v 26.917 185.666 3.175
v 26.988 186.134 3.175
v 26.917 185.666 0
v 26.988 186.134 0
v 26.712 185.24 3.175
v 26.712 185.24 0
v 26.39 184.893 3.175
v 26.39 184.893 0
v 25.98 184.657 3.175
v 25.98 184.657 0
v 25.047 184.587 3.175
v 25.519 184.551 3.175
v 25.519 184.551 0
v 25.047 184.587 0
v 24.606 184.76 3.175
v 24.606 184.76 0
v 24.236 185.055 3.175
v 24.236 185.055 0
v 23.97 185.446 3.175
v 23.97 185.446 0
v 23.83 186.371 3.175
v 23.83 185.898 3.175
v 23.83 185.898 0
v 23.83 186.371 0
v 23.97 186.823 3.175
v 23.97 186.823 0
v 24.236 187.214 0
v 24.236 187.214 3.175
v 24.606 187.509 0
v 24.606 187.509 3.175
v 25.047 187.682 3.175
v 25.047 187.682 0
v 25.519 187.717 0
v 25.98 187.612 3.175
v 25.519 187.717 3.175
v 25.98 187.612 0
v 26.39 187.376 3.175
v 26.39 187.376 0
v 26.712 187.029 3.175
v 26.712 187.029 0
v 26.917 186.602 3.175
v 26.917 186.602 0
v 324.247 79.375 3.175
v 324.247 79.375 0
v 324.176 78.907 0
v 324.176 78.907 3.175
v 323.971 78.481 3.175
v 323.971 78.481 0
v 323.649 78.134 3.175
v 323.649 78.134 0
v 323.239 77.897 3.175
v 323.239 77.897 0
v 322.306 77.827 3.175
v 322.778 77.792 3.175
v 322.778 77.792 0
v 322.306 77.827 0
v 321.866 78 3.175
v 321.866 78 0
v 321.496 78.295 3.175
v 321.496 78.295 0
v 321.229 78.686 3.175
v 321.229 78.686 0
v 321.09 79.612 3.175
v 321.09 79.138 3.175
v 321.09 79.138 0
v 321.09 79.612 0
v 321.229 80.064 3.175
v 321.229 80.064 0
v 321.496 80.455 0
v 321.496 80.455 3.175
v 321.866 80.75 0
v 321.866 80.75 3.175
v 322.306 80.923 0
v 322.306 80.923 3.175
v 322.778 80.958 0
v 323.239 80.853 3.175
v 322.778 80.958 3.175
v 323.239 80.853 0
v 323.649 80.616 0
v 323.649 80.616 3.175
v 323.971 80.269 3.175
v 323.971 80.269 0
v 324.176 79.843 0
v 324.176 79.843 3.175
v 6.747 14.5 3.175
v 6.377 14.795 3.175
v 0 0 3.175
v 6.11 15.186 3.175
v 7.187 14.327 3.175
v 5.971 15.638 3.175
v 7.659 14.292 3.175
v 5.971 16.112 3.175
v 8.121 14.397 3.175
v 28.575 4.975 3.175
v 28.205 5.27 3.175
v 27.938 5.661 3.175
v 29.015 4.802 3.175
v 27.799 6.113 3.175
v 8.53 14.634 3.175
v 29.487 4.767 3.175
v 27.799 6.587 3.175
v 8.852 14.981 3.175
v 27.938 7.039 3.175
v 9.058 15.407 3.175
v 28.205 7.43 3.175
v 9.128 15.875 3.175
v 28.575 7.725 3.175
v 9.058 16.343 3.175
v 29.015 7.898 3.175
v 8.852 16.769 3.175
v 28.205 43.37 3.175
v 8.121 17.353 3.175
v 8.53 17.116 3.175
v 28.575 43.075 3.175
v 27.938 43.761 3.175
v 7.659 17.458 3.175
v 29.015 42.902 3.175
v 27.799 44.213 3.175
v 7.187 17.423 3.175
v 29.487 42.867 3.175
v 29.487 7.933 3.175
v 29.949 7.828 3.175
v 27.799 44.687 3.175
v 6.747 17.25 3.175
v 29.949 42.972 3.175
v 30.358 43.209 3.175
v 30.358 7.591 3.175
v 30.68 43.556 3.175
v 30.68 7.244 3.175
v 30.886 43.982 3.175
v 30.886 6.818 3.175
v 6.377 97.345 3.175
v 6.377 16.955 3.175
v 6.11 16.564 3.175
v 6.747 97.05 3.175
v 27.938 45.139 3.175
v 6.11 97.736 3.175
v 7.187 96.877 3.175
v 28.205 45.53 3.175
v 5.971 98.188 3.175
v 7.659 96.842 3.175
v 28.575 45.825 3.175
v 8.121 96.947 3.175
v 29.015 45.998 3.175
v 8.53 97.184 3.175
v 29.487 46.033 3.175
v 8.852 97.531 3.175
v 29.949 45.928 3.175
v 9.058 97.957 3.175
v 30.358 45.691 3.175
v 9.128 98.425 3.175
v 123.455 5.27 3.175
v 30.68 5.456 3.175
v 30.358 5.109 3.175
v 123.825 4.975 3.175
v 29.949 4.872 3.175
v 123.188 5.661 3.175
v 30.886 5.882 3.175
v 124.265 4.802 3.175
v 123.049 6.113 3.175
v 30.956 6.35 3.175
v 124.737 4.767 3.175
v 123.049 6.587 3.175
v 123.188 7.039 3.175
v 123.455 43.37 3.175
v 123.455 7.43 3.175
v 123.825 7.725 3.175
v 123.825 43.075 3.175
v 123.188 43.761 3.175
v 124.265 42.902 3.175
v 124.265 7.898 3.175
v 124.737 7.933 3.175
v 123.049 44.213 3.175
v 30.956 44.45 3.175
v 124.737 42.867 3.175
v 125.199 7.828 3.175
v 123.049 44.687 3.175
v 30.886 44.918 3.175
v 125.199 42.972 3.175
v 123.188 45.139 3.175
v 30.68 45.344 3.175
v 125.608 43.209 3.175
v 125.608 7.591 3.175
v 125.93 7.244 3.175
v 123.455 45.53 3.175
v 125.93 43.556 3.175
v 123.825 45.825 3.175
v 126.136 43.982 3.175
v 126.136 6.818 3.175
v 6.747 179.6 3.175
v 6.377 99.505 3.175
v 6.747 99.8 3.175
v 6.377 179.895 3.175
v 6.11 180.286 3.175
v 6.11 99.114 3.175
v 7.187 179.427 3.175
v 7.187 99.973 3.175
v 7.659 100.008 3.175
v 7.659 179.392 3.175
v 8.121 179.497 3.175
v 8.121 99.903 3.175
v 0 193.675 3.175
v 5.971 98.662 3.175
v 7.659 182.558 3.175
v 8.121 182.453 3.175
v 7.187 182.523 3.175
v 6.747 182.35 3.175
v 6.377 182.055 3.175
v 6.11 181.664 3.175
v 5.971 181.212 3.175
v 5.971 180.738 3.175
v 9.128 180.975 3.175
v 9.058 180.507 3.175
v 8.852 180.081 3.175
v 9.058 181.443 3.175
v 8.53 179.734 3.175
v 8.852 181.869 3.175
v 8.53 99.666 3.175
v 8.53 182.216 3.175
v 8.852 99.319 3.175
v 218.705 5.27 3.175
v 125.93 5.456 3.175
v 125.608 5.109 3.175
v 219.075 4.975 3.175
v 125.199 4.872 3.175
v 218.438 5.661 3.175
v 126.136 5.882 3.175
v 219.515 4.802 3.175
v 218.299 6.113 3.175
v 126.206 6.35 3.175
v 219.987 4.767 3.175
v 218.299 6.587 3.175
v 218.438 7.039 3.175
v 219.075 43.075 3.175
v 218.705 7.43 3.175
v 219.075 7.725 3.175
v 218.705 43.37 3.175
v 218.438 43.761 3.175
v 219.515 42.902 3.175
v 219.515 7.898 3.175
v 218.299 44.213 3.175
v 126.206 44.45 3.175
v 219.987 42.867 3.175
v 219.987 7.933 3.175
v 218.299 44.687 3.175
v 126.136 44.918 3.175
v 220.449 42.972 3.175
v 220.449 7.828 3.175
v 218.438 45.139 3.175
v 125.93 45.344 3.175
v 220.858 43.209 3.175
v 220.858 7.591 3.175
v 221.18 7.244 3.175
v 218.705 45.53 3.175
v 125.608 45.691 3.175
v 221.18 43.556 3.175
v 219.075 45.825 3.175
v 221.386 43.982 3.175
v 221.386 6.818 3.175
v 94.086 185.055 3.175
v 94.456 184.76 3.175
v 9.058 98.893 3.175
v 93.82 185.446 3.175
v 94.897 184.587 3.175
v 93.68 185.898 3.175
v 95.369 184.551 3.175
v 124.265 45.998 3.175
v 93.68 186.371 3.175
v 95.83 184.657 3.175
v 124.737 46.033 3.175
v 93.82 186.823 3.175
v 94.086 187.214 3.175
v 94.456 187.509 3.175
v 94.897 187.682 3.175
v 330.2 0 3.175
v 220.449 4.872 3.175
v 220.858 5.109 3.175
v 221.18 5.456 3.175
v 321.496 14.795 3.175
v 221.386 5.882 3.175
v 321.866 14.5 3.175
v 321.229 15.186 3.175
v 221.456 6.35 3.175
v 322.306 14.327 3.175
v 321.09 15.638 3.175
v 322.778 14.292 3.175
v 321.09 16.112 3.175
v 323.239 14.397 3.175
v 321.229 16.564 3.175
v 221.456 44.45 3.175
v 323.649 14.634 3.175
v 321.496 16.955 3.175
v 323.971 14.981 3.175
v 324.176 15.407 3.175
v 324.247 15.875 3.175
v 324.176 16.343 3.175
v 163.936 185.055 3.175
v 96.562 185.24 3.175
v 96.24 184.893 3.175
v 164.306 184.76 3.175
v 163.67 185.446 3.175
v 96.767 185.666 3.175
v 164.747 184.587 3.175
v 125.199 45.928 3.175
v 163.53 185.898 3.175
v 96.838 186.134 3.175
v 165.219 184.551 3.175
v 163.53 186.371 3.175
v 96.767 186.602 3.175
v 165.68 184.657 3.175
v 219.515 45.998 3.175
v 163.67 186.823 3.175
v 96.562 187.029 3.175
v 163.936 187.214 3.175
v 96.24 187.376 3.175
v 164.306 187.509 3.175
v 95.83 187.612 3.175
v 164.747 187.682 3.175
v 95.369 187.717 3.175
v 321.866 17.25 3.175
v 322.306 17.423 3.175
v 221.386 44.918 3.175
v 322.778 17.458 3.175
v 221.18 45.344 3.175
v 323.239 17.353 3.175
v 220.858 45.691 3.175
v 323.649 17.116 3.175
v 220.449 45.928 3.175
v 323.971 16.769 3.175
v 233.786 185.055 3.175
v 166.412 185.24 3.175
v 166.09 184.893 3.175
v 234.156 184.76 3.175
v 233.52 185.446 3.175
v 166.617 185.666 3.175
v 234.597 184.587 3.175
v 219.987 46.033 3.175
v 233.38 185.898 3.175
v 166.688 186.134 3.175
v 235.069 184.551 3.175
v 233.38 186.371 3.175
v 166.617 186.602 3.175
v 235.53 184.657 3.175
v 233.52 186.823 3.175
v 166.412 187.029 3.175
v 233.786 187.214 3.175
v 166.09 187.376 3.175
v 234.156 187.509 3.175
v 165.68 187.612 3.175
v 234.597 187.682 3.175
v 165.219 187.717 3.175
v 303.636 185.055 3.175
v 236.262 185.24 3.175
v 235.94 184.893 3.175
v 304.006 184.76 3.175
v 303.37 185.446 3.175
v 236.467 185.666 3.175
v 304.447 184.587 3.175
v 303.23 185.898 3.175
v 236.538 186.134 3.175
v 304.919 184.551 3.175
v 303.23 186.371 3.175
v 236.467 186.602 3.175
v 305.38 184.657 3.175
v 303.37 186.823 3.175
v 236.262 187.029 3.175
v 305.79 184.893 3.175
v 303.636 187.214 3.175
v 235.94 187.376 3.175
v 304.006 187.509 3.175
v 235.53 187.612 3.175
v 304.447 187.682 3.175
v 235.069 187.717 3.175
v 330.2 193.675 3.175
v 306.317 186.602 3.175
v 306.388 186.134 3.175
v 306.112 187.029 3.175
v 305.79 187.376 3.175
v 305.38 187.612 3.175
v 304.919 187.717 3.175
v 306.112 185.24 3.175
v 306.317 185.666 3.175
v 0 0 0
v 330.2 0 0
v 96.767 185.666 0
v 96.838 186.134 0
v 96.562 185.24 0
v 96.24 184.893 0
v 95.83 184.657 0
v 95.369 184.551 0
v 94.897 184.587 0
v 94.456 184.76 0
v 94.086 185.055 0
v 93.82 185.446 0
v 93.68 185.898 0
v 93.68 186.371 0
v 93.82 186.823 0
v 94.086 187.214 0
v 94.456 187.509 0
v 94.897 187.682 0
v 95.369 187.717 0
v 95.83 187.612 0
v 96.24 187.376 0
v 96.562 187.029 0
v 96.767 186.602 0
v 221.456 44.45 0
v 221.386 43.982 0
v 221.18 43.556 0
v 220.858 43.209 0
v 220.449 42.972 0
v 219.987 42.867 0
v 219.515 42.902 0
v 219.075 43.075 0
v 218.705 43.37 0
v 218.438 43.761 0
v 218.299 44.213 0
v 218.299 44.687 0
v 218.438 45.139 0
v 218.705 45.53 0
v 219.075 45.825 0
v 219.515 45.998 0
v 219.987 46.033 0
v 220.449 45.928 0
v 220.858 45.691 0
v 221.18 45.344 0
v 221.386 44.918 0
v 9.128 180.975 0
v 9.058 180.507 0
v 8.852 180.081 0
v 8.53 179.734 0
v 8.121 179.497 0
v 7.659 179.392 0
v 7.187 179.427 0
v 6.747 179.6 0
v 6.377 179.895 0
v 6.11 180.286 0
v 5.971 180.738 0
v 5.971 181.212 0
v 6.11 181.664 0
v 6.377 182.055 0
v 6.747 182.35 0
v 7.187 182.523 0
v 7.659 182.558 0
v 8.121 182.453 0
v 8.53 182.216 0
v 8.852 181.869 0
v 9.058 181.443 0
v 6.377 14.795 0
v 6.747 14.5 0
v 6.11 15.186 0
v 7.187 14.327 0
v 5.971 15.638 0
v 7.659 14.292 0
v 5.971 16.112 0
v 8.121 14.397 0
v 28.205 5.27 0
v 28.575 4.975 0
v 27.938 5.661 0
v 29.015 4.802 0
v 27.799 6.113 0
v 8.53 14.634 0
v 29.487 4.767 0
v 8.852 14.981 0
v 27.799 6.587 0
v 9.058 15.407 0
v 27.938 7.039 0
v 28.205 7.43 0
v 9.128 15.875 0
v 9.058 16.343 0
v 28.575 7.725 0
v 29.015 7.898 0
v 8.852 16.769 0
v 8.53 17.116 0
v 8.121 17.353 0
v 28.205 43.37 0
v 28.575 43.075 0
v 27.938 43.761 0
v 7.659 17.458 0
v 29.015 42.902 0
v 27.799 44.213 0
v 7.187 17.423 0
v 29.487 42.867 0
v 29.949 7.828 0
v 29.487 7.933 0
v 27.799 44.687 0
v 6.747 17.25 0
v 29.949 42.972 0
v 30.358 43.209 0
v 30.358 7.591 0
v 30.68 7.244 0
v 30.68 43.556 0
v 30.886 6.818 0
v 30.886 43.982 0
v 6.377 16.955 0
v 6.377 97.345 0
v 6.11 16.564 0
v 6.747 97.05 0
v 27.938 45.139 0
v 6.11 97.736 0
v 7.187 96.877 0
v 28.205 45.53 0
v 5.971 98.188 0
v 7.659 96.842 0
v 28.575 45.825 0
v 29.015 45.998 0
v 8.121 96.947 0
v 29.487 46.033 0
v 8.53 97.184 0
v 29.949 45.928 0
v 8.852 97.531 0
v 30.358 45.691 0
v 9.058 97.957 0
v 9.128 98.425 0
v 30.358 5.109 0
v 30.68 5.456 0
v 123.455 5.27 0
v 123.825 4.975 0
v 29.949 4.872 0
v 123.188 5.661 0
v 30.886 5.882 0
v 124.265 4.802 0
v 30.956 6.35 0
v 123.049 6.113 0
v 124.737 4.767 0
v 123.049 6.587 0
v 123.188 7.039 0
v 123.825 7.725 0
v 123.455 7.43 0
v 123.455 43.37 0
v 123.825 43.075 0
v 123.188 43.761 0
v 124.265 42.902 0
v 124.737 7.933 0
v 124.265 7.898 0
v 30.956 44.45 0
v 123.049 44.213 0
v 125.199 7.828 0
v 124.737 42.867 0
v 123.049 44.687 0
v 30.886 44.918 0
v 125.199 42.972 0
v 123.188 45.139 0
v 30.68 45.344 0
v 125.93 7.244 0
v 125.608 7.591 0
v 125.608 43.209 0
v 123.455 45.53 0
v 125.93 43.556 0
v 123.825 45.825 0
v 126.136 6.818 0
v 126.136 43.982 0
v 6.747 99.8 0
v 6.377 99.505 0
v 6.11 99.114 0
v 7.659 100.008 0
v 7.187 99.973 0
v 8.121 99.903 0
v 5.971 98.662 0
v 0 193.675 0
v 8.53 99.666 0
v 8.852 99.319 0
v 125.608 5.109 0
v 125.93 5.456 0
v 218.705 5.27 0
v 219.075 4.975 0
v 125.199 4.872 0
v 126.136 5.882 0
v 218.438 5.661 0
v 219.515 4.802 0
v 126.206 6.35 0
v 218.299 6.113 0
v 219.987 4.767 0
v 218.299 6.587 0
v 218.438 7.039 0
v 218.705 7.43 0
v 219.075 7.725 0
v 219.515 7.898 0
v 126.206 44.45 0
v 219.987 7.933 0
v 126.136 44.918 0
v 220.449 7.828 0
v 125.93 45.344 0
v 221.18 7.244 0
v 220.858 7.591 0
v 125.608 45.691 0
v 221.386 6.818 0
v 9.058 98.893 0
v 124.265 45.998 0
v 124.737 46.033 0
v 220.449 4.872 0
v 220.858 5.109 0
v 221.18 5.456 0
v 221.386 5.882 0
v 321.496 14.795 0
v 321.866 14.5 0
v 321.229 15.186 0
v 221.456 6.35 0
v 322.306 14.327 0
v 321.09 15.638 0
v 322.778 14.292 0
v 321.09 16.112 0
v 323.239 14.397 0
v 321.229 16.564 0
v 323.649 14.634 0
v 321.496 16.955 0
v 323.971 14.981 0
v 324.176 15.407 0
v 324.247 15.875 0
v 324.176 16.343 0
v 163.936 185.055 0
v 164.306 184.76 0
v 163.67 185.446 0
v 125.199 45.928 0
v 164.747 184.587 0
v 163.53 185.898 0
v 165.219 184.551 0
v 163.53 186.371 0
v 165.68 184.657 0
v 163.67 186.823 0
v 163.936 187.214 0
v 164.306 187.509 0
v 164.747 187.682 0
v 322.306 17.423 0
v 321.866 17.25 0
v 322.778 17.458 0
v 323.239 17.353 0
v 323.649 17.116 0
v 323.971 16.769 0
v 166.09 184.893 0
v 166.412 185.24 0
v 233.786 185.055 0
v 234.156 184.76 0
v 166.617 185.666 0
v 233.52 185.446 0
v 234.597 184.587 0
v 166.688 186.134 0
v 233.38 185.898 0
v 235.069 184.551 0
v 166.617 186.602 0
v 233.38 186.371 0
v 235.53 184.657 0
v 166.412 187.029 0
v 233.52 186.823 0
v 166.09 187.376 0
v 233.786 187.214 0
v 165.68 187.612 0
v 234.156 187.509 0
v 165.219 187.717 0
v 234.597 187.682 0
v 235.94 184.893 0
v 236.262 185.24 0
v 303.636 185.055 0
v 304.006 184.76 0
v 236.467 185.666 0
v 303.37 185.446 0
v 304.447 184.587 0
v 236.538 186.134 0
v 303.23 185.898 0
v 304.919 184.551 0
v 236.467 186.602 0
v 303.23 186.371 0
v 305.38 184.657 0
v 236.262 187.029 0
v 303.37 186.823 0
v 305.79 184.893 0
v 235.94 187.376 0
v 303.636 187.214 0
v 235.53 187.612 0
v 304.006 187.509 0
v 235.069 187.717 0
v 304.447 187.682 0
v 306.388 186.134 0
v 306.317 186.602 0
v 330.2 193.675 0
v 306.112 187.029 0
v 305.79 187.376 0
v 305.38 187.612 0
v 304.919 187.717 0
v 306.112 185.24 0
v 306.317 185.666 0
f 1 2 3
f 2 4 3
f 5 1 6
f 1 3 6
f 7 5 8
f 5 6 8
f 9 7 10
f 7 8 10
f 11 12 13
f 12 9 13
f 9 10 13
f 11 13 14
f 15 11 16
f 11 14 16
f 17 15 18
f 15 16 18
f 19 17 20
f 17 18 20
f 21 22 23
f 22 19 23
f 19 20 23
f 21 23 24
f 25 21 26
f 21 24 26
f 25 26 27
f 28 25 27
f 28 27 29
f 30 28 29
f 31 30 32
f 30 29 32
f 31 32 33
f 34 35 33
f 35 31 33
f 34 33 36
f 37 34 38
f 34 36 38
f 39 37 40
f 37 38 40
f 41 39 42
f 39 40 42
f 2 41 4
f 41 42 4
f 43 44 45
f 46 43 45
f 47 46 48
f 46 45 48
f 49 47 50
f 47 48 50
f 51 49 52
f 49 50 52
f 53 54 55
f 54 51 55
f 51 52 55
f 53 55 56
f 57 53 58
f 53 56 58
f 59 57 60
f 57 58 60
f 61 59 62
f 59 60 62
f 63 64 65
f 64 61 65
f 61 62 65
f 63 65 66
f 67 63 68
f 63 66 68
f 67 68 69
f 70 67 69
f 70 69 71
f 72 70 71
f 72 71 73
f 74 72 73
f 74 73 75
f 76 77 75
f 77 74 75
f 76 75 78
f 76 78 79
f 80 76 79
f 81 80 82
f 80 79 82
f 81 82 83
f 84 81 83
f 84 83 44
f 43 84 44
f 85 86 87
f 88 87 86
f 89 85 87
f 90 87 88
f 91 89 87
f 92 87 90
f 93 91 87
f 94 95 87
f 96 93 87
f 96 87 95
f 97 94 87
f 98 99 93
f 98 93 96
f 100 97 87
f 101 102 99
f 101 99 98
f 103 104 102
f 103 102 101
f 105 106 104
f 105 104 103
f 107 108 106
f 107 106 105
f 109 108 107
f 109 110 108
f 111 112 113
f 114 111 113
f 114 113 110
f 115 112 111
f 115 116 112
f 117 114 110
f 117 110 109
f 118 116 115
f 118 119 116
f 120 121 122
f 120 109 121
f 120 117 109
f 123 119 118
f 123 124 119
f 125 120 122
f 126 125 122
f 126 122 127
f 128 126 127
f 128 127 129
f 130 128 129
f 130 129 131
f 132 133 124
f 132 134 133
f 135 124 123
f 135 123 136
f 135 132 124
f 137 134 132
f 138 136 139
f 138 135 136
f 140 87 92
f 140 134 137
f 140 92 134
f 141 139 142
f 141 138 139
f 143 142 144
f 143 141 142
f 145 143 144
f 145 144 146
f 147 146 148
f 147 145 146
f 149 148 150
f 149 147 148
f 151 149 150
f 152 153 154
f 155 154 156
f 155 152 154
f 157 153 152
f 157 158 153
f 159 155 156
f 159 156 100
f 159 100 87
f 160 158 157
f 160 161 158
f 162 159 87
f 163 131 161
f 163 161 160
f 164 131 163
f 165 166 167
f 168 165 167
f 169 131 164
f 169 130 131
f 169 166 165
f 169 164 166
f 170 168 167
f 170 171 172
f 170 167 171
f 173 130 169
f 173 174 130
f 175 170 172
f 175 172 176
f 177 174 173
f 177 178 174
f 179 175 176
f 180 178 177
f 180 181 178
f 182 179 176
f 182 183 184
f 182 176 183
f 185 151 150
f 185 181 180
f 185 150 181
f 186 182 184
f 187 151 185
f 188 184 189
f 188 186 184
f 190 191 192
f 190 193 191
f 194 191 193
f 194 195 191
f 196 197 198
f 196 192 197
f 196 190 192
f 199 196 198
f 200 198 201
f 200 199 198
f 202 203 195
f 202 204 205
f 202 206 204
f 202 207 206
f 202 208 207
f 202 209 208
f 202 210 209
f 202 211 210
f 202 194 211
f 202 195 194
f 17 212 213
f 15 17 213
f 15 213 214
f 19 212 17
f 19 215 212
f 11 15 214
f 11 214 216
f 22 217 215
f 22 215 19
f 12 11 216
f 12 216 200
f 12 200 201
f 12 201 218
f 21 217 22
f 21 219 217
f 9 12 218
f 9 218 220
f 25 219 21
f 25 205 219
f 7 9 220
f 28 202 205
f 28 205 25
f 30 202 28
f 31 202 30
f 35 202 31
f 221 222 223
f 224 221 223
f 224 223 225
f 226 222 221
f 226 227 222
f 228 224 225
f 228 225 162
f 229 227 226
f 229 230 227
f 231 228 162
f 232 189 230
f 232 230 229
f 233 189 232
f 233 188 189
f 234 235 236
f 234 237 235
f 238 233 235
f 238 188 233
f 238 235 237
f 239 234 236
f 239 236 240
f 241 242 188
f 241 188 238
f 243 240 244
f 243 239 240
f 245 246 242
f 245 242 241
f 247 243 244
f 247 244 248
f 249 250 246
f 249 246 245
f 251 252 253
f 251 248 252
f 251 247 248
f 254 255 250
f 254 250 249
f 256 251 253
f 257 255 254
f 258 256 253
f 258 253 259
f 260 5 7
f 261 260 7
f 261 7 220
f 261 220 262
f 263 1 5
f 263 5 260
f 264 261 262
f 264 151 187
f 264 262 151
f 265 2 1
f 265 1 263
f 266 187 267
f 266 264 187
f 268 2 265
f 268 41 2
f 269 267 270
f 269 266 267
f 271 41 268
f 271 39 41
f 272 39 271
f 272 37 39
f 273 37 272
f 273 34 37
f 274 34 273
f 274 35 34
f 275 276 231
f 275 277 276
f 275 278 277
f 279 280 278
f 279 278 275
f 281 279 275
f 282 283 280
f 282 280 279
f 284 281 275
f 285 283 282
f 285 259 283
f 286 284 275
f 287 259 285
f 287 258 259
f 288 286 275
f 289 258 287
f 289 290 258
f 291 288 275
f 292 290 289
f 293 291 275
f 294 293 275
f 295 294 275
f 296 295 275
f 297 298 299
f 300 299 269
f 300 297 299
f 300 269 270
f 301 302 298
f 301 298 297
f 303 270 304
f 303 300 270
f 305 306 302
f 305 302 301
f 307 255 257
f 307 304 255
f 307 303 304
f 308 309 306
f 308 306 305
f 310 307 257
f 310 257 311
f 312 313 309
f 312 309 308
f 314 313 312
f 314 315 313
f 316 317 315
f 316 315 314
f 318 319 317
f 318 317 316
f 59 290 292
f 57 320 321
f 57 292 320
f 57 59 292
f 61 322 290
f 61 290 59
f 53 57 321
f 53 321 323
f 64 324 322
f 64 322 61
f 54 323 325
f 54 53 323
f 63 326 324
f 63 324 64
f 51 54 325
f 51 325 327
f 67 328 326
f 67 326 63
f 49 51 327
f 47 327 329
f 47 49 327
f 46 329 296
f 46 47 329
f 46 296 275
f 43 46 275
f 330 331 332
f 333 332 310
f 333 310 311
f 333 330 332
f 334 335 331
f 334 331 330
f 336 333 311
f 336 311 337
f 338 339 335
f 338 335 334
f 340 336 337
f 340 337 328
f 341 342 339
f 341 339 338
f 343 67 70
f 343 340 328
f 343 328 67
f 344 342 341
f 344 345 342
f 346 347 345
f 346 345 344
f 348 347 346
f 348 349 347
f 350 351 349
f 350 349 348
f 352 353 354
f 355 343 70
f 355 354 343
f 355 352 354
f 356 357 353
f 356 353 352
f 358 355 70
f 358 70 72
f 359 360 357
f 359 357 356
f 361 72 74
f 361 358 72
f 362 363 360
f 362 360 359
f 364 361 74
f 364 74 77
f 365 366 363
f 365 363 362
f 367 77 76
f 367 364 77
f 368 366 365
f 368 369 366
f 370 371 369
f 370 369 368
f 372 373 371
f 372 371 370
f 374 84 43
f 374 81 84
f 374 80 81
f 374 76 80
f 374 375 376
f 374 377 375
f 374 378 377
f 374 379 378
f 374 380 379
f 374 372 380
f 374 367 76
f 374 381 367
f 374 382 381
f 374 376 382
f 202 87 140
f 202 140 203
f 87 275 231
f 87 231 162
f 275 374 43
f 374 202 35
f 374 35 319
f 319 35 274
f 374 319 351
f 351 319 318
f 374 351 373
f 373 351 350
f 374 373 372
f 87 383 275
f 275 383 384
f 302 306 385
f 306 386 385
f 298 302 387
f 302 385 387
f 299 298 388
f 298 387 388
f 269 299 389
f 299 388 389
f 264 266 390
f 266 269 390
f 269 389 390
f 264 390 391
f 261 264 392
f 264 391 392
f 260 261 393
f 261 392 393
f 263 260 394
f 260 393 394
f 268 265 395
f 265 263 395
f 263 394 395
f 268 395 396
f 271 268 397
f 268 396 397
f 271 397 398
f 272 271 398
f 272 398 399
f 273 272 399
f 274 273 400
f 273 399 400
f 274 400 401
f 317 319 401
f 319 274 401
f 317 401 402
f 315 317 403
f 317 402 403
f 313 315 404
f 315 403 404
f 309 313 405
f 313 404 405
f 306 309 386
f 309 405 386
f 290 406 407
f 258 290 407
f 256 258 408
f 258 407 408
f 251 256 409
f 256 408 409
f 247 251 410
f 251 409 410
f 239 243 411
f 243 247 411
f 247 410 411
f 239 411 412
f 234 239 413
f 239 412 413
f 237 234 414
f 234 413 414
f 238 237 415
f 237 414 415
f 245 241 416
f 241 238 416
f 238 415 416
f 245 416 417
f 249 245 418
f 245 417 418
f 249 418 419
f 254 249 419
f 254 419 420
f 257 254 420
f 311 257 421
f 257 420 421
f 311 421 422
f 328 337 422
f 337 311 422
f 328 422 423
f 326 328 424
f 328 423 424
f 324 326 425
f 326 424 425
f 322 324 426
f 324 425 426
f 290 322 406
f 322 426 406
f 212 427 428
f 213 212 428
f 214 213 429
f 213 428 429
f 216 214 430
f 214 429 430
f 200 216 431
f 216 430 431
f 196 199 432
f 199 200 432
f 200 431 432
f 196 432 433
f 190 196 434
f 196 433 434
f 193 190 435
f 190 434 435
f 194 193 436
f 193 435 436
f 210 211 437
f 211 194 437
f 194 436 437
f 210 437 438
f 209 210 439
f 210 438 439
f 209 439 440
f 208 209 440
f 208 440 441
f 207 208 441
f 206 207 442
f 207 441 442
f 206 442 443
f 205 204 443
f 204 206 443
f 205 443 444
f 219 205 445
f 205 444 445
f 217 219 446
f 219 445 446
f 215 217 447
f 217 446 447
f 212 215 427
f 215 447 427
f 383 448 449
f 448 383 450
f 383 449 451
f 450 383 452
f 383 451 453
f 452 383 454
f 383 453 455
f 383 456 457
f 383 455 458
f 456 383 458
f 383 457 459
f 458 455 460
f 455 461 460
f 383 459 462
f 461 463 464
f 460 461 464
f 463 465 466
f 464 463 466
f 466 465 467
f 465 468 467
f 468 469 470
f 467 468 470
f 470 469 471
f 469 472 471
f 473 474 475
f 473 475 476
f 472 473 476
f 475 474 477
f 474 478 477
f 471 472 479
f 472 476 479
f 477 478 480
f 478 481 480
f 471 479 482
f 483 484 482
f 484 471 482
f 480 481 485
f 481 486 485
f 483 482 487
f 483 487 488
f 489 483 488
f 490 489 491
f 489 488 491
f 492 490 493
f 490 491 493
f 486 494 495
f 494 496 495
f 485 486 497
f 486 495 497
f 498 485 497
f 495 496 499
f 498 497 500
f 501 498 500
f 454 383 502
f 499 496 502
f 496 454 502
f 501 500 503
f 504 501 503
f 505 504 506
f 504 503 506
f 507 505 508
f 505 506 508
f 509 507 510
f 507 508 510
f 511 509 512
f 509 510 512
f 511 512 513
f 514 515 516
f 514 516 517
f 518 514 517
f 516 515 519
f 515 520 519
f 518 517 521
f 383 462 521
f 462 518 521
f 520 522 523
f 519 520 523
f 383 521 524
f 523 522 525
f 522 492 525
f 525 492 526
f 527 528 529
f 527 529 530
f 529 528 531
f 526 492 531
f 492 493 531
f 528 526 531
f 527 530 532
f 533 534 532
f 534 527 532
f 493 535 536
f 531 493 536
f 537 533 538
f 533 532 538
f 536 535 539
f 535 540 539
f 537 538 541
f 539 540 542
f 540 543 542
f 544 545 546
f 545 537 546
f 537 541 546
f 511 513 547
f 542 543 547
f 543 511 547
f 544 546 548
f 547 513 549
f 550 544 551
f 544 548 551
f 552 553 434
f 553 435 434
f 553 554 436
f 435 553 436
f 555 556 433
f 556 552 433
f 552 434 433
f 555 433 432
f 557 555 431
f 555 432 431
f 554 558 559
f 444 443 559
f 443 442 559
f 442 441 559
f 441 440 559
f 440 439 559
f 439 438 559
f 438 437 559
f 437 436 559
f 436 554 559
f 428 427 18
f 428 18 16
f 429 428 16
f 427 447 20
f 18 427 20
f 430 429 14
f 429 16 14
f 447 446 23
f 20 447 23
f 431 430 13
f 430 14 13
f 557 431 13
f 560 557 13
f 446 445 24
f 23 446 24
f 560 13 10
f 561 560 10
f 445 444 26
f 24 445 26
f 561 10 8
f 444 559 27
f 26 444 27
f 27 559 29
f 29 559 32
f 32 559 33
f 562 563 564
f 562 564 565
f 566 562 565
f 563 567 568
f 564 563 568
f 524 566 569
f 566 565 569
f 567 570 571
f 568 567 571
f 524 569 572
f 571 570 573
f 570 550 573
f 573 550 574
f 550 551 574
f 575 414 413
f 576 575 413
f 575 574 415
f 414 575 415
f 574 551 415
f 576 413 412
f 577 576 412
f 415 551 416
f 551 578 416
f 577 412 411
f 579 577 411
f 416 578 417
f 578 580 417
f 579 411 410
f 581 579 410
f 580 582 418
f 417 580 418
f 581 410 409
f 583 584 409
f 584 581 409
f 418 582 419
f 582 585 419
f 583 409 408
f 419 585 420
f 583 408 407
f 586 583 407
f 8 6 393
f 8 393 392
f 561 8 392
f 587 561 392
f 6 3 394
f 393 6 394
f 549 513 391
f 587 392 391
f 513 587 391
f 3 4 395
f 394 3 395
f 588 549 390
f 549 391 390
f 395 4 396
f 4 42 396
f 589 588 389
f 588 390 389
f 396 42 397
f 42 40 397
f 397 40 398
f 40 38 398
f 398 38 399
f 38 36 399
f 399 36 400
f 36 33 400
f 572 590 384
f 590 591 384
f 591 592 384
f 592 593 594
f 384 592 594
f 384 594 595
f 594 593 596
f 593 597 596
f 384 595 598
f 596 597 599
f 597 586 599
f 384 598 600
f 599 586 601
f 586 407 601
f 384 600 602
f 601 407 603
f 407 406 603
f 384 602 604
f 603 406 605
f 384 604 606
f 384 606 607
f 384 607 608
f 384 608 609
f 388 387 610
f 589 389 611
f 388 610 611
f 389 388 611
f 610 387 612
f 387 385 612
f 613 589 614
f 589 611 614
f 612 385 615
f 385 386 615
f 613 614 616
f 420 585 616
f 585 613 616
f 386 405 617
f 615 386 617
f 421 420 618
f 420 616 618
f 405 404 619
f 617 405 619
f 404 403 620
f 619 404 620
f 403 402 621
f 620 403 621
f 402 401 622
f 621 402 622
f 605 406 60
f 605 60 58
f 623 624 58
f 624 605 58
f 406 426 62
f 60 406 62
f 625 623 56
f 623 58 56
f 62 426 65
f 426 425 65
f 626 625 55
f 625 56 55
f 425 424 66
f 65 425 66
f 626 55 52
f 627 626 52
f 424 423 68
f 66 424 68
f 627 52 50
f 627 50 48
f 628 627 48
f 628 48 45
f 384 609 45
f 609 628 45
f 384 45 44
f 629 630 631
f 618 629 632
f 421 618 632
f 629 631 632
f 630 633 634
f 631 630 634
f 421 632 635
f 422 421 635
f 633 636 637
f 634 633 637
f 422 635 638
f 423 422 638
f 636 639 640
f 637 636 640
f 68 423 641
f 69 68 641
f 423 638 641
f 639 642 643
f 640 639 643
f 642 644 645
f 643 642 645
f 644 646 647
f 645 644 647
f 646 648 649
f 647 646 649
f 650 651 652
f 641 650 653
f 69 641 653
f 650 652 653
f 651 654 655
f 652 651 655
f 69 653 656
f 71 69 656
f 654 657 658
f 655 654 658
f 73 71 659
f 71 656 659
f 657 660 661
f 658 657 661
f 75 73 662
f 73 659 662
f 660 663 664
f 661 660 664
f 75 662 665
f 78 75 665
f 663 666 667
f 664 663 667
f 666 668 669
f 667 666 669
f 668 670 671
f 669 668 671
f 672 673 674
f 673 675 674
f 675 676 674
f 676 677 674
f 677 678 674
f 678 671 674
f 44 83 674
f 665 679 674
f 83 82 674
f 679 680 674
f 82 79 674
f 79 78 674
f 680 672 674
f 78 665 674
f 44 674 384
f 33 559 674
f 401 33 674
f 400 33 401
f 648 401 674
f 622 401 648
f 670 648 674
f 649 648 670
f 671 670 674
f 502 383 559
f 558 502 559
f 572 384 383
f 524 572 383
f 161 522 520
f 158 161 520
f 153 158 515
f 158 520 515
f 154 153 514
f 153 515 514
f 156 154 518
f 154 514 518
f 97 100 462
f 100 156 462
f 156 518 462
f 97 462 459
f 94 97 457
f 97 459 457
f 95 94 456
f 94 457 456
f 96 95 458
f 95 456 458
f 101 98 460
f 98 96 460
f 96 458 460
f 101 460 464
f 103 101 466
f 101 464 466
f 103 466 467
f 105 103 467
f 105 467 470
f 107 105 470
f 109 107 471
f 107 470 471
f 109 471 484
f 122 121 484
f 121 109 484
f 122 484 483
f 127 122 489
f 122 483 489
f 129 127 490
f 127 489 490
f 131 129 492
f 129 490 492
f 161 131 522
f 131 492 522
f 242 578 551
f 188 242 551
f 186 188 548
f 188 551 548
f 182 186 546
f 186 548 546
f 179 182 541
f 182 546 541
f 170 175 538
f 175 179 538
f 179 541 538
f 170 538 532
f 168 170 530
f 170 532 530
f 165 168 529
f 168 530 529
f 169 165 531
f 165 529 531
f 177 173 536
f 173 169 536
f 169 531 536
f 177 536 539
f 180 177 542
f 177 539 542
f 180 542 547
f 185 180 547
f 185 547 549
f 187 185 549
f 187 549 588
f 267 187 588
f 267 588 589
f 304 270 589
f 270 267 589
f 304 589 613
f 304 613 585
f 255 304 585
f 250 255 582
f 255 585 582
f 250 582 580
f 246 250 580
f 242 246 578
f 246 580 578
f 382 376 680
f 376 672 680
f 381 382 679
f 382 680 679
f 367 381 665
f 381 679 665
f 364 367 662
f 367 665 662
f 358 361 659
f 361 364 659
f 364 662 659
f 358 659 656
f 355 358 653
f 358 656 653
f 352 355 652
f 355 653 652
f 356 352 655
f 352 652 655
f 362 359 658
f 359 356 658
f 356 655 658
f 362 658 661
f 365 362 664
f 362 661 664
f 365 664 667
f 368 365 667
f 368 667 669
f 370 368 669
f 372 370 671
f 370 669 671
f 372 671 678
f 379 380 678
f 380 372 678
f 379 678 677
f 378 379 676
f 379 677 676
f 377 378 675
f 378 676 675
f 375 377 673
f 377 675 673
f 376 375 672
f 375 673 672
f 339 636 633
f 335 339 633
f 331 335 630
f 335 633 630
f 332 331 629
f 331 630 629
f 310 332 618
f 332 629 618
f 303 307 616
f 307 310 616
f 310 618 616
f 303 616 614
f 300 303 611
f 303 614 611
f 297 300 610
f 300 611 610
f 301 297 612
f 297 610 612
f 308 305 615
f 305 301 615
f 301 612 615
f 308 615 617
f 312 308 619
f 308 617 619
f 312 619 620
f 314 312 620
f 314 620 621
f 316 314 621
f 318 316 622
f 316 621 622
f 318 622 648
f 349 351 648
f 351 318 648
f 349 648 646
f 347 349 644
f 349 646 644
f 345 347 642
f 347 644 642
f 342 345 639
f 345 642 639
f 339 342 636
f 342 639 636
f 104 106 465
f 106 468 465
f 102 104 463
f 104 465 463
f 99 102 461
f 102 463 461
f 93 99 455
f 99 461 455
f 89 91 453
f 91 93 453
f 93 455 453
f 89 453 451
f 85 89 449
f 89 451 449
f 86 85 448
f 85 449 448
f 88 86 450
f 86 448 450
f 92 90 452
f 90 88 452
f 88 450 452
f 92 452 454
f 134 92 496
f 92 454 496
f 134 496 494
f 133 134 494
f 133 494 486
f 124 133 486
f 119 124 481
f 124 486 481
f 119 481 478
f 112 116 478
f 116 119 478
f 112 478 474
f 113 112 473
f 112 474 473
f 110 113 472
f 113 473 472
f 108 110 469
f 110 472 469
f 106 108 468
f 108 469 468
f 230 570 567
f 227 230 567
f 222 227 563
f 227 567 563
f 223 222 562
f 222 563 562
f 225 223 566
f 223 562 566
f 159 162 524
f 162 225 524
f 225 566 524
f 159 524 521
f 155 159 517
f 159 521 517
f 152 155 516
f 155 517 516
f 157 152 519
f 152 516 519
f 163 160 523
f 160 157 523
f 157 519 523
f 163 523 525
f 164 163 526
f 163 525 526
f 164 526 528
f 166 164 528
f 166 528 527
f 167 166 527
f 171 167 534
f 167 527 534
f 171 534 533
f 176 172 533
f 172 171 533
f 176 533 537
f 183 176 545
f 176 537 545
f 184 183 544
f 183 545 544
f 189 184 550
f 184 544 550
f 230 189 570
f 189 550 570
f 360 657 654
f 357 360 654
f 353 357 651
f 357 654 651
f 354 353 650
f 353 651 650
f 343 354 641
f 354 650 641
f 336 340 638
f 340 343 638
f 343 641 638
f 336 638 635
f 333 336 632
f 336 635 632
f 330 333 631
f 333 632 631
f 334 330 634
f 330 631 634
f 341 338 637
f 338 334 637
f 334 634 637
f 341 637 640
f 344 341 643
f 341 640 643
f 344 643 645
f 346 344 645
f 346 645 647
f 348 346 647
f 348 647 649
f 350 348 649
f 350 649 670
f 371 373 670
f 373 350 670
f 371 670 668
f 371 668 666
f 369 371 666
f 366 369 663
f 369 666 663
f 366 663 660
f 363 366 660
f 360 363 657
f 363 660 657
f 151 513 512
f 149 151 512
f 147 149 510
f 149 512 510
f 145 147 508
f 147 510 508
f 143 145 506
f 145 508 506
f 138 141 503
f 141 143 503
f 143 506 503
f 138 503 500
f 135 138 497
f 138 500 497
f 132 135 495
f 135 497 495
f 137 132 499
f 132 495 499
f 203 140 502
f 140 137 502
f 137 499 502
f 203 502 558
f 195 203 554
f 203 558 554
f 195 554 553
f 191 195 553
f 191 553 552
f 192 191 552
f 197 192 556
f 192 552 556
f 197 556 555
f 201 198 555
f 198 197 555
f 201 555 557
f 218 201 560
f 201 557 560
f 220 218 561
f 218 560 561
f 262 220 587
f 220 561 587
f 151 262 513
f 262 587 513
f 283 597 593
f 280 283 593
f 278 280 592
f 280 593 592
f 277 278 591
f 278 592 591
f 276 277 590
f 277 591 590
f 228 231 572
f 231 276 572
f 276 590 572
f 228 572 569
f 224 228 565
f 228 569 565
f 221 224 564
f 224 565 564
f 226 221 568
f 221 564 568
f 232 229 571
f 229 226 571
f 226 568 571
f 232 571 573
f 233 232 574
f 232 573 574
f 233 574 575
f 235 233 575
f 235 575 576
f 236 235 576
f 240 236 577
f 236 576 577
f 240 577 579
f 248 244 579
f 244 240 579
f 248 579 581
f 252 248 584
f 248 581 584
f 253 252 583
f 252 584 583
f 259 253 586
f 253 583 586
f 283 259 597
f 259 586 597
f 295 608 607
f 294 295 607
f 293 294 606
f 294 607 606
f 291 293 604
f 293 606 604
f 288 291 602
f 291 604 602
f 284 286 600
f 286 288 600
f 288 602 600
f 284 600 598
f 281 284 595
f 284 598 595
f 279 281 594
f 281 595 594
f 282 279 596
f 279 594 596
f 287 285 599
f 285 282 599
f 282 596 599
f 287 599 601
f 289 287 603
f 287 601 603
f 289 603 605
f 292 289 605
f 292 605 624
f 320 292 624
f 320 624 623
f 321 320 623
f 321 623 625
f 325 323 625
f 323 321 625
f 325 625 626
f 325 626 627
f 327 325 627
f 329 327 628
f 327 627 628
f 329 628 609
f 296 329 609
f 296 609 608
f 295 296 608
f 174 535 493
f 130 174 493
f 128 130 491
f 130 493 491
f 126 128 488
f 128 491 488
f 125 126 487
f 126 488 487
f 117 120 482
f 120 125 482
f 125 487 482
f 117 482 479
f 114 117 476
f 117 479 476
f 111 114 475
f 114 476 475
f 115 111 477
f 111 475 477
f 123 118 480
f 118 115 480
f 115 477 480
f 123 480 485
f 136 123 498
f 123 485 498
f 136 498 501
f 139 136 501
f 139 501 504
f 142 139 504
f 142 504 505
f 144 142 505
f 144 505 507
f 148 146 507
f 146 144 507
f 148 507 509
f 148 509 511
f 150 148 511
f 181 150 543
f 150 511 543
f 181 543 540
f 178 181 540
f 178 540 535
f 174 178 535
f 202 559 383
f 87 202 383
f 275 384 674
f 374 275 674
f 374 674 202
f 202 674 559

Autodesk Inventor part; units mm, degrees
ref_plane "YZ Plane" through (0, 0, 0) normal (1, 0, 0) x (0, 1, 0)
ref_plane "XZ Plane" through (0, 0, 0) normal (0, 1, 0) x (-1, 0, 0)
ref_plane "XY Plane" through (0, 0, 0) normal (0, 0, 1) x (1, 0, 0)
sketch "Sketch1" plane through (0, 0, 0) normal (0, 0, 1) x (1, 0, 0)
  line L0 (0, 0) -> (330.2, 0)
  line L1 (330.2, 0) -> (330.2, 193.675)
  line L2 (330.2, 193.675) -> (0, 193.675)
  line L3 (0, 193.675) -> (0, 0)
  circle A0 centre (234.95, 186.1344) radius 1.5875 projected
  circle A1 centre (95.25, 186.1344) radius 1.5875 projected
  circle A2 centre (25.4, 186.1344) radius 1.5875 projected
  circle A3 centre (165.1, 186.1344) radius 1.5875 projected
  circle A4 centre (304.8, 186.1344) radius 1.5875 projected
  line L4 (19.05, 178.5937) -> (19.05, 194.4687) construction
  line L5 (19.05, 178.5937) -> (311.15, 178.5937) construction
  line L6 (311.15, 194.4687) -> (311.15, 178.5937) construction
  line L7 (19.05, 194.4687) -> (311.15, 194.4687) construction
  circle A5 centre (115.0937, -106.3625) radius 2.54 construction
  circle A6 centre (26.1937, -106.3625) radius 2.54 construction
  circle A7 centre (219.8687, 6.35) radius 1.5875 projected
  circle A8 centre (124.6187, 6.35) radius 1.5875 projected
  circle A9 centre (29.3687, 6.35) radius 1.5875 projected
  circle A10 centre (219.8687, 44.45) radius 1.5875 projected
  circle A11 centre (124.6187, 44.45) radius 1.5875 projected
  circle A12 centre (29.3687, 44.45) radius 1.5875 projected
  line L8 (127.7937, -114.3) -> (127.7937, -88.9) construction
  line L9 (127.7937, -88.9) -> (146.8437, -88.9) construction
  line L10 (146.8437, -88.9) -> (146.8437, -114.3) construction
  line L11 (146.8437, -114.3) -> (296.0687, -114.3) construction
  line L12 (296.0687, -114.3) -> (226.2187, 0) construction
  line L13 (226.2187, 0) -> (226.2187, 50.8) construction
  line L14 (226.2187, 50.8) -> (16.6687, 50.8) construction
  line L15 (16.6687, 50.8) -> (16.6687, -114.3) construction
  line L16 (16.6687, -114.3) -> (127.7937, -114.3) construction
  circle A13 centre (7.5406, 98.425) radius 1.5875 projected
  circle A14 centre (7.5406, 15.875) radius 1.5875 projected
  circle A15 centre (7.5406, 180.975) radius 1.5875 projected
  line L17 (15.0812, 3.175) -> (-0.7937, 3.175) construction
  line L18 (15.0812, 3.175) -> (15.0812, 193.675) construction
  line L19 (-0.7937, 193.675) -> (15.0812, 193.675) construction
  line L20 (-0.7937, 3.175) -> (-0.7937, 193.675) construction
  circle A16 centre (322.6594, 15.875) radius 1.5875 projected
  circle A17 centre (322.6594, 79.375) radius 1.5875 projected
  line L21 (330.9938, 6.35) -> (315.1188, 6.35) construction
  line L22 (330.9938, 6.35) -> (330.9938, 88.9) construction
  line L23 (315.1188, 88.9) -> (330.9938, 88.9) construction
  line L24 (315.1188, 6.35) -> (315.1188, 88.9) construction
  dimension "d0" = 330.2
  dimension "d1" = 193.675
extrude "Extrusion1" add sketch "Sketch1" along normal blind 3.175
properties part number "Hopper Left Side" material "Polycarbonate, Clear"
